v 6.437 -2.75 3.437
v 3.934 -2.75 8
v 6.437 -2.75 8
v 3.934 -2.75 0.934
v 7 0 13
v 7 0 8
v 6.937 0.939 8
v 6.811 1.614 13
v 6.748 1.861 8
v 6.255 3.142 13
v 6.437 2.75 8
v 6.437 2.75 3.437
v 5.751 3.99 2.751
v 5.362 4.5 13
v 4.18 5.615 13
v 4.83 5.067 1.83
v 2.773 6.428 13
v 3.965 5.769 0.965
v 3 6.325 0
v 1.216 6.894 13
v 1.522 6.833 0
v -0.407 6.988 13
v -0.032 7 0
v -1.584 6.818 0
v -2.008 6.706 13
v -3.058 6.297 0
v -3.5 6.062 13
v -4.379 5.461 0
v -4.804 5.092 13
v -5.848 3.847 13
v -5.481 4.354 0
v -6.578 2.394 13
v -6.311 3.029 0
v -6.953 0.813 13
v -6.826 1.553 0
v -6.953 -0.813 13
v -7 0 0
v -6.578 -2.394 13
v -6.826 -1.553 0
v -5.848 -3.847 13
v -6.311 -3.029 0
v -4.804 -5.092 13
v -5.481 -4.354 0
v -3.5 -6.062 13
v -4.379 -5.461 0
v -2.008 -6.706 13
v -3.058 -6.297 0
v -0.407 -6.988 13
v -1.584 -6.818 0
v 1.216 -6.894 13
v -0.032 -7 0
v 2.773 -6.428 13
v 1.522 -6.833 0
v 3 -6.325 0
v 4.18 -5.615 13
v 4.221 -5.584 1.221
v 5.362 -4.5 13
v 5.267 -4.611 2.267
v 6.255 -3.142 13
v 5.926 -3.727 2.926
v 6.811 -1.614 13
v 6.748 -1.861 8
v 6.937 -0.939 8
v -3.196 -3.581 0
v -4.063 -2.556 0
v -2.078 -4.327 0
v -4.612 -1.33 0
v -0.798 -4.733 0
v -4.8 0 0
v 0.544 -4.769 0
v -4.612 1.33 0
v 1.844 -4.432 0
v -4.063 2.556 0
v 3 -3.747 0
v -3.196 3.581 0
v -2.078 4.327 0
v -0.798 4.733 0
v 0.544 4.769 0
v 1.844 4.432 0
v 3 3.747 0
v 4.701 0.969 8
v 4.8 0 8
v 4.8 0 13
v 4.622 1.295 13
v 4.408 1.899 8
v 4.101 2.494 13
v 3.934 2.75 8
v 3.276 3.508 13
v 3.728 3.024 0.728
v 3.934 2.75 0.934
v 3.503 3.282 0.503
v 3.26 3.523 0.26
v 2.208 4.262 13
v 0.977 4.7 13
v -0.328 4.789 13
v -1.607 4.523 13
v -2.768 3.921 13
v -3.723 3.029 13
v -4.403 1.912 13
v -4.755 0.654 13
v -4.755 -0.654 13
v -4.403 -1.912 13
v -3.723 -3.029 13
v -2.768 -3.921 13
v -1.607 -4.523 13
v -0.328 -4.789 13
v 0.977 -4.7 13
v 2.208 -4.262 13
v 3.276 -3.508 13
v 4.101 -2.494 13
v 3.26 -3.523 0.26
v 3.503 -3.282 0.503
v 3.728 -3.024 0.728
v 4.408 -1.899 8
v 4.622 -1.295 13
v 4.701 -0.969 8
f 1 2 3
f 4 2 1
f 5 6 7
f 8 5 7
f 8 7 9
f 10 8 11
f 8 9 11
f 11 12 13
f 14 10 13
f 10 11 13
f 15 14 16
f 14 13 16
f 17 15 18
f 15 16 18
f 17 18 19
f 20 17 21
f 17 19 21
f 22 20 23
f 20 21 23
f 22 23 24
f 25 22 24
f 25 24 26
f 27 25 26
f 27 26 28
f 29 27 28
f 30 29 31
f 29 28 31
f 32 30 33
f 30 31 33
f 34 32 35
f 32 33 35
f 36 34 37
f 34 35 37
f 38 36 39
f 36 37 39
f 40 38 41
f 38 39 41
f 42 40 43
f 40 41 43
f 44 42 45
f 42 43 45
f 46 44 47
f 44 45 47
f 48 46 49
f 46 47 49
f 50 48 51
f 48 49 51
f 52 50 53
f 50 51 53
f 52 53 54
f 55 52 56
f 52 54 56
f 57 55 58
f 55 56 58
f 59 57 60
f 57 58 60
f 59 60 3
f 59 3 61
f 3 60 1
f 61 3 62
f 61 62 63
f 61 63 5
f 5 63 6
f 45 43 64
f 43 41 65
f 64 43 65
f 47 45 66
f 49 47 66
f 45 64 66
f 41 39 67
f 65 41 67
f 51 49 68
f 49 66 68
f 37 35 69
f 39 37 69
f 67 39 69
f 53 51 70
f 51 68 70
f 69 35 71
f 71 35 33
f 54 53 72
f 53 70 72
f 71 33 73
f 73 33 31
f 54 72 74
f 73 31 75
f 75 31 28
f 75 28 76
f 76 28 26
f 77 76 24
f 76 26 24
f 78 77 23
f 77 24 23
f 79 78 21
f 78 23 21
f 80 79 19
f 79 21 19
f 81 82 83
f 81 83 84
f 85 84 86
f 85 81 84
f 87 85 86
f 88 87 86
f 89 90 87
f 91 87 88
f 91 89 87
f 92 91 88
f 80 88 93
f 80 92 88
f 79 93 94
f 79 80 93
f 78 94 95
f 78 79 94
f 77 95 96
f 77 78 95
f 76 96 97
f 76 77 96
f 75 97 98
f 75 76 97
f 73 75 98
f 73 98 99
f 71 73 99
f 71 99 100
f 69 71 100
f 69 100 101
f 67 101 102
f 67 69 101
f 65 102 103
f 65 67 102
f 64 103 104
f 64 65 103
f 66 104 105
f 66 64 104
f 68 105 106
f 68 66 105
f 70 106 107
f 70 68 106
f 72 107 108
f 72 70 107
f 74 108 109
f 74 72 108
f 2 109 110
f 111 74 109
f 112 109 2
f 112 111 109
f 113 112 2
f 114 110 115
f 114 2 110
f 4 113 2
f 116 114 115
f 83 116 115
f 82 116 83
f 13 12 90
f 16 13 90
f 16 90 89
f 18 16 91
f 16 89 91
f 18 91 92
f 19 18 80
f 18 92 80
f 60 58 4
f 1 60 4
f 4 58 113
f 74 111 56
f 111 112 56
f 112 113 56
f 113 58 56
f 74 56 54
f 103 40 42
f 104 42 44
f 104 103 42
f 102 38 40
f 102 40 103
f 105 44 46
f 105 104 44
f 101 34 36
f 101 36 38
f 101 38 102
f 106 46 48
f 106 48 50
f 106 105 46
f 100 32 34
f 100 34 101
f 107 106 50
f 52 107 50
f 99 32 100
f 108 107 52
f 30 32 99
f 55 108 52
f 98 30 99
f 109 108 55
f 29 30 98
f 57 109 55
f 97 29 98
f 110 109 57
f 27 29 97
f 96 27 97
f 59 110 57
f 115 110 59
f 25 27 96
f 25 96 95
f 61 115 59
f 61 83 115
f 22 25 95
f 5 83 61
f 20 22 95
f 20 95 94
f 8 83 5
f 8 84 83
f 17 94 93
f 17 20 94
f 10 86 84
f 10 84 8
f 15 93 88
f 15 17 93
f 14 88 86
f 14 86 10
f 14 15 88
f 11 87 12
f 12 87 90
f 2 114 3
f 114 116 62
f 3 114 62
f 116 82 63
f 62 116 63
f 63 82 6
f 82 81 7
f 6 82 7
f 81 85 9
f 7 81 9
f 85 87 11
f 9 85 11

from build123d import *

# Parameters (mm, degrees)
F0_R     = 7
F0_R_2   = 4.8
F1_DEPTH = 13
F2_W     = 6.828025
F2_H     = 5.5
F3_DEPTH = 8
F5_DEPTH = 12.5


with BuildPart() as f1:
    # F0 (on Top) → F1 (new body)
    with BuildSketch(Plane.XY):
        Circle(F0_R)
        Circle(F0_R_2, mode=Mode.SUBTRACT)
    extrude(amount=F1_DEPTH)

    # F2 (on Top) → F3 (cut)
    with BuildSketch(Plane.XY):
        with Locations((6.614012, 0)):
            Rectangle(F2_W, F2_H)
    extrude(amount=F3_DEPTH, mode=Mode.SUBTRACT)

    # F4 (on Front) → F5 (cut, symmetric)
    with BuildSketch(Plane.XZ):
        Polygon((3, 0), (6.5, 0), (6.5, 3.5), align=None)
    extrude(amount=F5_DEPTH, both=True, mode=Mode.SUBTRACT)


solid = f1.part
